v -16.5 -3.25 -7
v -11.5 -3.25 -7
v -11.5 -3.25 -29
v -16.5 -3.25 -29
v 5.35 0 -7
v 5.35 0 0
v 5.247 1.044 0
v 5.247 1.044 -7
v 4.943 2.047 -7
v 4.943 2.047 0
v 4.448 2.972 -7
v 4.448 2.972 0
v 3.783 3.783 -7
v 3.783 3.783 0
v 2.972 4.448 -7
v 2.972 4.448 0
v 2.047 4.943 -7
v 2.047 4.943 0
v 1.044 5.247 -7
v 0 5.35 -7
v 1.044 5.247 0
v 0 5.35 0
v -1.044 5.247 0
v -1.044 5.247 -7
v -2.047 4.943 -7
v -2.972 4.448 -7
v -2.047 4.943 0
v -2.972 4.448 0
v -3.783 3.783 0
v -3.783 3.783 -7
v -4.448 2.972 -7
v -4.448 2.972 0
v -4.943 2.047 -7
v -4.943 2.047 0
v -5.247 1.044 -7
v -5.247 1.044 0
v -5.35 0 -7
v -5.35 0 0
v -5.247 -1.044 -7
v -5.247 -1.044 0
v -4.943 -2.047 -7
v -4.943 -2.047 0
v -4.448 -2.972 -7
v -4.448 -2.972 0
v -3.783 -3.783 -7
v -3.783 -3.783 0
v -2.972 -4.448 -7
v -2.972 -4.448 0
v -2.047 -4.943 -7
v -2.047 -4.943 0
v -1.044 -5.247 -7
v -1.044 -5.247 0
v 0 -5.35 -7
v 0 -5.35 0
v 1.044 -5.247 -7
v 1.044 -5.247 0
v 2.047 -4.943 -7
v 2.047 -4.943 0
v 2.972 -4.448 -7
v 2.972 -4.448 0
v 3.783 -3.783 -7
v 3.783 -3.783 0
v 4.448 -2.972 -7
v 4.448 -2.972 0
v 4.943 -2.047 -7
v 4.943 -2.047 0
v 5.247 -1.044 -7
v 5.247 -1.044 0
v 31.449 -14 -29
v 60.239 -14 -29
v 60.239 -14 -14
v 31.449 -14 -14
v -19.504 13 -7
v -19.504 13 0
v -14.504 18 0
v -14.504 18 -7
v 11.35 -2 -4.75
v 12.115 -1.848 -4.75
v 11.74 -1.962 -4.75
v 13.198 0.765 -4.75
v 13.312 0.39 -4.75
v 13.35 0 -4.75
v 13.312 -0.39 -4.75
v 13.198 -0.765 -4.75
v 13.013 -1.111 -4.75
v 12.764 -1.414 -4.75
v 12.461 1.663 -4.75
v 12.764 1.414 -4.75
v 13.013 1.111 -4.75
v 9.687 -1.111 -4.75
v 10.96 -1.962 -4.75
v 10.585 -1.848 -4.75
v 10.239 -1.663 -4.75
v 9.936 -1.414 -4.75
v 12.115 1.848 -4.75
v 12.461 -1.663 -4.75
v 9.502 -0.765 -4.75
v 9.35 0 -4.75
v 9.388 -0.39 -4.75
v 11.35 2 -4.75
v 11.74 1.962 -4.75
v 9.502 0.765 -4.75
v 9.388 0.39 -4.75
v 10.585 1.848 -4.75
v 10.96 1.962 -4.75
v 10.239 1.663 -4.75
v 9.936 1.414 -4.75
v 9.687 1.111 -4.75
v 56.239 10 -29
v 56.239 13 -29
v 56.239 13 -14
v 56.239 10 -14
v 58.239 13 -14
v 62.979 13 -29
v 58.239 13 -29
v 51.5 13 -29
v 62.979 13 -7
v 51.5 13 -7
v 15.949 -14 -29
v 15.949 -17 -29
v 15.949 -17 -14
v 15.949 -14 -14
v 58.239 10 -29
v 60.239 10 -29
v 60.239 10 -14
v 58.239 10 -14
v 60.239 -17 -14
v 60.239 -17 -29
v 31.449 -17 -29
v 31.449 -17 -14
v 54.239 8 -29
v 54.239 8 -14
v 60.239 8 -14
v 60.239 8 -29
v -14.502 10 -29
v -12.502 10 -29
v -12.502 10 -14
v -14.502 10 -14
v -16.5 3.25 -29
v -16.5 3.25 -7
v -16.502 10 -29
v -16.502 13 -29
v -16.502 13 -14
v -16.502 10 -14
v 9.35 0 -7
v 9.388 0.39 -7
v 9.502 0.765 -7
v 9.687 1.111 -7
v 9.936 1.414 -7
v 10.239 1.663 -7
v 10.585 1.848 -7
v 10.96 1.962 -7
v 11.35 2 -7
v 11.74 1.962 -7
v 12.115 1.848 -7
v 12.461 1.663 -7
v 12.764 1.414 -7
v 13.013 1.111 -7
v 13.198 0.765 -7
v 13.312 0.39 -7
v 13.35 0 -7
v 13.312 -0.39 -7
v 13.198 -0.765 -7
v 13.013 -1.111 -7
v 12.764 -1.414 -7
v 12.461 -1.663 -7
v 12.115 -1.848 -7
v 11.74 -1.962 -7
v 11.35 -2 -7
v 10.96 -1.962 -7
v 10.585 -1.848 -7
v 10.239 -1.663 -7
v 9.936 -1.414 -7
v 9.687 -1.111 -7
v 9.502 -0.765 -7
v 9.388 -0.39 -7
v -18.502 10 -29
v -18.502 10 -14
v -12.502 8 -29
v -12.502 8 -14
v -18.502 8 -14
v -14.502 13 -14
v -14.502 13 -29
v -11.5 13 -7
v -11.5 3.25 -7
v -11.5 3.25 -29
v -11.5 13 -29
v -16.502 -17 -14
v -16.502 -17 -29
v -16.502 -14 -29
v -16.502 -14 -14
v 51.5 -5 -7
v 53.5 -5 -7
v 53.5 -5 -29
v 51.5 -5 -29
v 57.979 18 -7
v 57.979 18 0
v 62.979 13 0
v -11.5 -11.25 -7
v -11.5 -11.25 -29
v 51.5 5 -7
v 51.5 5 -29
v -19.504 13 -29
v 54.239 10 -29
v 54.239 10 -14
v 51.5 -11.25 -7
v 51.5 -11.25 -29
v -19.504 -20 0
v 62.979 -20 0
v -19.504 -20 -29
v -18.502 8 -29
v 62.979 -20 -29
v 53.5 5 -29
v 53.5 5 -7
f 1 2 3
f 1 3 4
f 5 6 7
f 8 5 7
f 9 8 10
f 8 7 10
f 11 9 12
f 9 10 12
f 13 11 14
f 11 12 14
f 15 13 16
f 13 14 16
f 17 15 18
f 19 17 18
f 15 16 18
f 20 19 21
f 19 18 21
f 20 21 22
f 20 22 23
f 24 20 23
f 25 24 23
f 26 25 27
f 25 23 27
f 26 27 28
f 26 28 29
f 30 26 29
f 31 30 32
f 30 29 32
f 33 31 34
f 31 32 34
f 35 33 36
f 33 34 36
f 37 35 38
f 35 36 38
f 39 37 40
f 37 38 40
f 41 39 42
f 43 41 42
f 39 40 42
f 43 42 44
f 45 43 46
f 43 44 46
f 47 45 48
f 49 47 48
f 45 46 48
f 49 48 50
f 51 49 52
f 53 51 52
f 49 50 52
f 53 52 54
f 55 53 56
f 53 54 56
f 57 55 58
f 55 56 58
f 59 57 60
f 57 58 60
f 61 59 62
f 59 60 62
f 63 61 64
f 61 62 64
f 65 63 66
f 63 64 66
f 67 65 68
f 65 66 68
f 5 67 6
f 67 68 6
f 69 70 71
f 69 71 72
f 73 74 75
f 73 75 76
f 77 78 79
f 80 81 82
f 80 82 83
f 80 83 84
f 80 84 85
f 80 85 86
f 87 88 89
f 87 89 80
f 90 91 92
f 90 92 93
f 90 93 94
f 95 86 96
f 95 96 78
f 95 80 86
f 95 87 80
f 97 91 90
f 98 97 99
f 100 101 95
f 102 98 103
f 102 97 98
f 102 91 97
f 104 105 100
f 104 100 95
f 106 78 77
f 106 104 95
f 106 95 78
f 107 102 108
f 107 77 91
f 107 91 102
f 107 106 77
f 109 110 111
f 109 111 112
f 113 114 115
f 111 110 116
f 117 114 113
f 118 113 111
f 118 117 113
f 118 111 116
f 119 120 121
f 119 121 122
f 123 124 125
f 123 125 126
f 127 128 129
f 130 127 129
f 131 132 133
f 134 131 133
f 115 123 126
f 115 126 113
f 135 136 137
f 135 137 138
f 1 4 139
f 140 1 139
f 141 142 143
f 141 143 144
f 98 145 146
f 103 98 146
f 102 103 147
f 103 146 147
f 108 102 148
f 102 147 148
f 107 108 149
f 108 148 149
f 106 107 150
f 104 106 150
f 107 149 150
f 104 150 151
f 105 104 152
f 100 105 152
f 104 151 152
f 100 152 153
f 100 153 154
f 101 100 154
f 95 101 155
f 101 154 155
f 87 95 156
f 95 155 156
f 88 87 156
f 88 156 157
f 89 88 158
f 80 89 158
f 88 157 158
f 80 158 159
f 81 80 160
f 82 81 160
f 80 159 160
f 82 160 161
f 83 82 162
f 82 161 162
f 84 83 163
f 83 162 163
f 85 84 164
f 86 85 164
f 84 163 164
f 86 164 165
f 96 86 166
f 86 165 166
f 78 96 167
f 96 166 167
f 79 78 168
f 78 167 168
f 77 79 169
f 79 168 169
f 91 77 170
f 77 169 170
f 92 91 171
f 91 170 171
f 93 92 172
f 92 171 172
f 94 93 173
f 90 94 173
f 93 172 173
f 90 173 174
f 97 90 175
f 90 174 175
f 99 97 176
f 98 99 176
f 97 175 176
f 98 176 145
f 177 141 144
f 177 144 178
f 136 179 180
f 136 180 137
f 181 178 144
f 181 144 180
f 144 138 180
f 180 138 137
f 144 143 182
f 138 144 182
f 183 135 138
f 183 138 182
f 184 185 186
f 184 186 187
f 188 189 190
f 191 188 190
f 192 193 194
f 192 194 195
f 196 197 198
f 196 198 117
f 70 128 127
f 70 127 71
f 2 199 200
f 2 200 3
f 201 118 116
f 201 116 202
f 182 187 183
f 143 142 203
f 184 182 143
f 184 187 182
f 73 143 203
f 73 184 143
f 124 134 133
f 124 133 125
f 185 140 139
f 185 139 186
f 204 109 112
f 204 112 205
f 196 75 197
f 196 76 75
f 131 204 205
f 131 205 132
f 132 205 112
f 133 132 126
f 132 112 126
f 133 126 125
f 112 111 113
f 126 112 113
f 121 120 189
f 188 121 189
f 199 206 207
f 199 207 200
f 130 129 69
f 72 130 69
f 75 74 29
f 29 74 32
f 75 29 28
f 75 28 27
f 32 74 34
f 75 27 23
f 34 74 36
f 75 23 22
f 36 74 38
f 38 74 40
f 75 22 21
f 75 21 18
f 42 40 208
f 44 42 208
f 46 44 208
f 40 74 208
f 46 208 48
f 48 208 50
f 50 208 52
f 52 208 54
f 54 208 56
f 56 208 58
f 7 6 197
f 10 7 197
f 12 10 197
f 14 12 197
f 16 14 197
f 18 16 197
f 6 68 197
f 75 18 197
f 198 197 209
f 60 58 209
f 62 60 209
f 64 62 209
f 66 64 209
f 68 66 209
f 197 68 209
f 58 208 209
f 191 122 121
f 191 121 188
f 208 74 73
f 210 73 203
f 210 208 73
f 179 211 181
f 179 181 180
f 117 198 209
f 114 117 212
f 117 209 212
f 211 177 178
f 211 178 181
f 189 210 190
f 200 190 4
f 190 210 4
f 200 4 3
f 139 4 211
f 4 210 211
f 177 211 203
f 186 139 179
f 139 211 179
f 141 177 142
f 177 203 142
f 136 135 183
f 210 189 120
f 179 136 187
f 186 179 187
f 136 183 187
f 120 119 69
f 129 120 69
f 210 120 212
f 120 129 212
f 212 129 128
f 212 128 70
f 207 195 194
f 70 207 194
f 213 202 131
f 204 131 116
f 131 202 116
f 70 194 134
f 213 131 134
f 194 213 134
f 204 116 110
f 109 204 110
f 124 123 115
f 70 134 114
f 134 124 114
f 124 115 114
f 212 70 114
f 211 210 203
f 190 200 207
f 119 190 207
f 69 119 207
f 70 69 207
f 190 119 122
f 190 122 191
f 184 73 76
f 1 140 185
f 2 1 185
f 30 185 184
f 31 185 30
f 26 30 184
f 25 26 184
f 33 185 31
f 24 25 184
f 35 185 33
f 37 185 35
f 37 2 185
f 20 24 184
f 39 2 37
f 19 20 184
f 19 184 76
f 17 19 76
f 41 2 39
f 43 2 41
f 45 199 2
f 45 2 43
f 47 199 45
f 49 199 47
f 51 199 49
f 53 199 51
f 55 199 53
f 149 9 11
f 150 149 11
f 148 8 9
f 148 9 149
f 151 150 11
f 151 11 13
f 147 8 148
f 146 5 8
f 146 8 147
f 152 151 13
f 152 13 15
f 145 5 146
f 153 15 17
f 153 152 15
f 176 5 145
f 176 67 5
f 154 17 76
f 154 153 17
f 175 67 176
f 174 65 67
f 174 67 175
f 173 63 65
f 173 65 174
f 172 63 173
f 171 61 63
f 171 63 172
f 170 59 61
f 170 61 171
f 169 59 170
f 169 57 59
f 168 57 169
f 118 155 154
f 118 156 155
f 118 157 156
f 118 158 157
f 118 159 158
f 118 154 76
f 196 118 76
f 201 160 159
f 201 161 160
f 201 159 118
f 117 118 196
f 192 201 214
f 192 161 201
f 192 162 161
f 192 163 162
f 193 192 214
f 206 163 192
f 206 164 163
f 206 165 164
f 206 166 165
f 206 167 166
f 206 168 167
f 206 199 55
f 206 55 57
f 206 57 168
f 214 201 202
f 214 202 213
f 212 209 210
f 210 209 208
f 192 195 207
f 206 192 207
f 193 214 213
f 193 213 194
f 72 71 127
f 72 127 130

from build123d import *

# Parameters (mm, degrees)
SKETCH1_R           = 5.35
BOSS_EXTRUDE2_DEPTH = 7
SKETCH8_R           = 2
CUT_EXTRUDE2_DEPTH  = 2.25
BOSS_EXTRUDE3_DEPTH = 22
SKETCH10_W          = 82.482524805
SKETCH10_H          = 7
BOSS_EXTRUDE4_DEPTH = 5
CHAMFER1_SIZE       = 5
SKETCH11_W          = 28.790613911
SKETCH11_H          = 3
SKETCH11_W_2        = 32.450648491
CUT_EXTRUDE3_DEPTH  = 15


with BuildPart() as part:
    # Sketch1 → Boss-Extrude2 (new body)
    with BuildSketch(Plane.XY):
        Polygon((-19.503784034, 13), (-19.503784034, -20), (19.503784034, -20), (62.978740771, -20), (62.978740771, 13), (19.503784034, 13), align=None)
        Circle(SKETCH1_R, mode=Mode.SUBTRACT)
    extrude(amount=-BOSS_EXTRUDE2_DEPTH)

    # Sketch8 → Cut-Extrude2 (cut)
    with BuildSketch(Plane(origin=(0, 0, -7), x_dir=(-1, 0, 0), z_dir=(0, 0, -1))):
        with Locations((-11.35, 0)):
            Circle(SKETCH8_R)
    extrude(amount=-CUT_EXTRUDE2_DEPTH, mode=Mode.SUBTRACT)

    # Sketch9 → Boss-Extrude3 (add)
    with BuildSketch(Plane(origin=(0, 0, -7), x_dir=(-1, 0, 0), z_dir=(0, 0, -1))):
        Polygon((11.5, 3.25), (11.5, 13), (19.503784034, 13), (19.503784034, -12.662545792), (19.503784034, -20), (-56.5, -20), (-62.978740771, -20), (-62.978740771, 13), (-51.5, 13), (-51.5, 5), (-53.5, 5), (-53.5, -5), (-51.5, -5), (-51.5, -11.25), (11.5, -11.25), (11.5, -3.25), (16.5, -3.25), (16.5, 3.25), align=None)
    extrude(amount=BOSS_EXTRUDE3_DEPTH)

    # Sketch10 → Boss-Extrude4 (add)
    with BuildSketch(Plane(origin=(0, 13, 0), x_dir=(1, 0, 0), z_dir=(0, 1, 0))):
        with Locations((21.737478368, 3.5)):
            Rectangle(SKETCH10_W, SKETCH10_H)
    extrude(amount=BOSS_EXTRUDE4_DEPTH)

    # Chamfer1
    chamfer1_edges = [part.edges().sort_by_distance(p)[0] for p in [
        (62.978740771, 18, -3.5),
        (-19.503784034, 18, -3.5),
    ]]
    chamfer(chamfer1_edges, length=CHAMFER1_SIZE)

    # Sketch11 → Cut-Extrude3 (cut)
    with BuildSketch(Plane(origin=(0, 0, -29), x_dir=(-1, 0, 0), z_dir=(0, 0, -1))):
        Polygon((-60.239370385, 10), (-58.239370385, 10), (-58.239370385, 13), (-56.239370385, 13), (-56.239370385, 10), (-54.239370385, 10), (-54.239370385, 8), (-60.239370385, 8), align=None)
        with Locations((-45.84406343, -15.5)):
            Rectangle(SKETCH11_W, SKETCH11_H)
        with Locations((0.276567771, -15.5)):
            Rectangle(SKETCH11_W_2, SKETCH11_H)
        Polygon((14.501892017, 13), (16.501892017, 13), (16.501892017, 10), (18.501892017, 10), (18.501892017, 8), (12.501892017, 8), (12.501892017, 10), (14.501892017, 10), align=None)
    extrude(amount=-CUT_EXTRUDE3_DEPTH, mode=Mode.SUBTRACT)


solid = part.part
